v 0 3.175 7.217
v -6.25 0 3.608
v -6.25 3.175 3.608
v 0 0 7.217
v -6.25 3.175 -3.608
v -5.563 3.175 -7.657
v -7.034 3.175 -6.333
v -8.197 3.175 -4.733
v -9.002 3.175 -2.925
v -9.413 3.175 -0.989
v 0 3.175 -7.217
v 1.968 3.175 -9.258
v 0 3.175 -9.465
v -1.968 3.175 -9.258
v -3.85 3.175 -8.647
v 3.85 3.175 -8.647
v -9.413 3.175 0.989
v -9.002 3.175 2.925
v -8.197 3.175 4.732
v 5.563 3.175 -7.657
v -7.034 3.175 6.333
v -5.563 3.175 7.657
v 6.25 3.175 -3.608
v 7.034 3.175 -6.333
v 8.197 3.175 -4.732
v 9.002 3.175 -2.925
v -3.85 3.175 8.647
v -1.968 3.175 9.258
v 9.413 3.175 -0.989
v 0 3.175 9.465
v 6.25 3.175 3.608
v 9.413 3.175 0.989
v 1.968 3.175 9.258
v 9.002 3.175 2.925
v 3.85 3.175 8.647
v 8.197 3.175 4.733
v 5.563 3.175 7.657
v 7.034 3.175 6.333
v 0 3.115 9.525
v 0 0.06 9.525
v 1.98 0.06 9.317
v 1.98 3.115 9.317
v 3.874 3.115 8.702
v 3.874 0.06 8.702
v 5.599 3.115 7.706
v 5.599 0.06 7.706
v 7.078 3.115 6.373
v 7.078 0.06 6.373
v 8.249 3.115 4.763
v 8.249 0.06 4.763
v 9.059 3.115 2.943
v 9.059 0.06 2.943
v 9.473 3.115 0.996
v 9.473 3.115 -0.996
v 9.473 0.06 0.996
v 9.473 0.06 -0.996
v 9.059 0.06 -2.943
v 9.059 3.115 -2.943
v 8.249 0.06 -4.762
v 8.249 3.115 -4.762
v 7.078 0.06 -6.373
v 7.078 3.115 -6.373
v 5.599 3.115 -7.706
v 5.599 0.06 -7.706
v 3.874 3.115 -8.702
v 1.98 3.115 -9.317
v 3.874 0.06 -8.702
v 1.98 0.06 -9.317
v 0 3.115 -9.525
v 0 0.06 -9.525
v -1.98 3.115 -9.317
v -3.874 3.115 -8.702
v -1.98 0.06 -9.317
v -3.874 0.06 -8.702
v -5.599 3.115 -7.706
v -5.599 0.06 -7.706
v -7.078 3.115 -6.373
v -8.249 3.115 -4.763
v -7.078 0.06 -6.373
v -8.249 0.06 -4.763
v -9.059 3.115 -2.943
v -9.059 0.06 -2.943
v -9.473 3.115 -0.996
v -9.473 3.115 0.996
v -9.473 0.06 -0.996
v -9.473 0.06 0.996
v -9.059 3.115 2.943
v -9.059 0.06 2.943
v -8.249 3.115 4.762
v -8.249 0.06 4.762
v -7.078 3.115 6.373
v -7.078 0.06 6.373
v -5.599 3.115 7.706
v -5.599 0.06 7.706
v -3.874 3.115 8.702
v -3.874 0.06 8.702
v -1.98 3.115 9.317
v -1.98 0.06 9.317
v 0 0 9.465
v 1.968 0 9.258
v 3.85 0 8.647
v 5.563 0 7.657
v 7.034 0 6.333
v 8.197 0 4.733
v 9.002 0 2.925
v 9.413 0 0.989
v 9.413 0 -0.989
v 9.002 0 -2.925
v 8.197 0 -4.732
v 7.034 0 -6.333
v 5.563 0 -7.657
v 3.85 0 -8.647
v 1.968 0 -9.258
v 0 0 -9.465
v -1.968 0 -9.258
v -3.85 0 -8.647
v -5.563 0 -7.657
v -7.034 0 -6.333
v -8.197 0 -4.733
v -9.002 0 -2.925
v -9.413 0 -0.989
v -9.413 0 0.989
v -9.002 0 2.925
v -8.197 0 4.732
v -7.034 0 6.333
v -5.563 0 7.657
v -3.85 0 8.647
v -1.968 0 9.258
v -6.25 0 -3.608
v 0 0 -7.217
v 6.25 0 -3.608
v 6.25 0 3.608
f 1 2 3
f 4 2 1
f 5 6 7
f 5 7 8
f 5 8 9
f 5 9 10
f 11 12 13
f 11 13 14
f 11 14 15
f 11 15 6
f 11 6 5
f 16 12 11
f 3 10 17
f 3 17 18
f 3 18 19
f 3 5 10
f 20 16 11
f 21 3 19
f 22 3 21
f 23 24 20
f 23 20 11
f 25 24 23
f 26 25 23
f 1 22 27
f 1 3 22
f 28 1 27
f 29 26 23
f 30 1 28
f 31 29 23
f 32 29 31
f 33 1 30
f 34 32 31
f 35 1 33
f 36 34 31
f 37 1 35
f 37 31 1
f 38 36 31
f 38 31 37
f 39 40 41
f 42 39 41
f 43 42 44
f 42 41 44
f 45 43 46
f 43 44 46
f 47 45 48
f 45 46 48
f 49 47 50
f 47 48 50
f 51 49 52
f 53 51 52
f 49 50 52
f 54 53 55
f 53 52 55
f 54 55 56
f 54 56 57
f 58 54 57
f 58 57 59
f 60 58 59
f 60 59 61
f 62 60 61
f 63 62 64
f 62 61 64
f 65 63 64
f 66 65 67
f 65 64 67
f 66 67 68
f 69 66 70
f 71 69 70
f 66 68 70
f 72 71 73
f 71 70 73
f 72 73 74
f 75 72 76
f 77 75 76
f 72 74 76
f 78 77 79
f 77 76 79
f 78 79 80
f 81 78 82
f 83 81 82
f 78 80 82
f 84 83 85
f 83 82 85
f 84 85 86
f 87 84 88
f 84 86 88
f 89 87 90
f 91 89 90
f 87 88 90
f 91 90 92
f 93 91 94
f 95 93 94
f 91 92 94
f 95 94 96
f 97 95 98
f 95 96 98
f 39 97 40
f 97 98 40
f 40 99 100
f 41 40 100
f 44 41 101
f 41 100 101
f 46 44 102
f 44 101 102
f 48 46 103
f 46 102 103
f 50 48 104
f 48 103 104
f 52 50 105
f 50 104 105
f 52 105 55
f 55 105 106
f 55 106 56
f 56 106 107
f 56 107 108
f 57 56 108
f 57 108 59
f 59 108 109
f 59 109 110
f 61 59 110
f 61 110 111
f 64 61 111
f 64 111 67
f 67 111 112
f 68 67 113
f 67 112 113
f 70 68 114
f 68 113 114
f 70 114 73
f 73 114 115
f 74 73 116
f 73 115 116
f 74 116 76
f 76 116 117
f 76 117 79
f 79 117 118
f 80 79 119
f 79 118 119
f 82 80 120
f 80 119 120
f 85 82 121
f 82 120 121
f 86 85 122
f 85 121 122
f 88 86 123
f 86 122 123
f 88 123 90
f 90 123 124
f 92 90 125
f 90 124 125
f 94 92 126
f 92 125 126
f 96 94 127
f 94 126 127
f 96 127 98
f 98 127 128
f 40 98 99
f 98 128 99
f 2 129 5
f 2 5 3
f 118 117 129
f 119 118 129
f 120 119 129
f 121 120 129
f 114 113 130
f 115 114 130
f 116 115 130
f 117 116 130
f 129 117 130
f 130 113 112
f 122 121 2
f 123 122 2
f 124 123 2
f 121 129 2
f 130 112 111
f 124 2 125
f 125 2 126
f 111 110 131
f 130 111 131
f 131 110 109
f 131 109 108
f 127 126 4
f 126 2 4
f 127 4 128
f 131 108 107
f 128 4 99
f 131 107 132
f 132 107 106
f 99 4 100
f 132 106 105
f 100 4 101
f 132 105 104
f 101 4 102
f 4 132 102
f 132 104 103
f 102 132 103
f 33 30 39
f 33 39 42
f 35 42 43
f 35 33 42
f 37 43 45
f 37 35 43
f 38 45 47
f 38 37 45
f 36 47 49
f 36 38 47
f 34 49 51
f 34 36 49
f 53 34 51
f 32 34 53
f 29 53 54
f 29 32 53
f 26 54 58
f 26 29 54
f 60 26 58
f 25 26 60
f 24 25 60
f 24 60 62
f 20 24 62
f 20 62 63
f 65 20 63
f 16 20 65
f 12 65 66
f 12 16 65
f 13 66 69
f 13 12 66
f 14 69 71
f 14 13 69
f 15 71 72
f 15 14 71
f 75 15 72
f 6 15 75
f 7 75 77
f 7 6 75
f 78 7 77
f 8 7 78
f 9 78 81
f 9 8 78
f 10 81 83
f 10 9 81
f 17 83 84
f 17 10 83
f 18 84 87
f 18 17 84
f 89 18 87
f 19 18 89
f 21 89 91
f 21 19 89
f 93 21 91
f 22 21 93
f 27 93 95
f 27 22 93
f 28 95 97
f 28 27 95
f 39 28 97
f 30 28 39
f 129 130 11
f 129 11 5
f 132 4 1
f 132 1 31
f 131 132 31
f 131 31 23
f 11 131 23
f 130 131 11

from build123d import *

# Parameters (mm, degrees)
SKETCH1_R           = 9.525
BOSS_EXTRUDE1_DEPTH = 3.175
CHAMFER1_SIZE       = 0.06
CHAMFER2_SIZE       = 0.06


with BuildPart() as part:
    # Sketch1 → Boss-Extrude1 (new body)
    with BuildSketch(Plane(origin=(0, 0, 0), x_dir=(1, 0, 0), z_dir=(0, 1, 0))):
        with Locations(Location((0, 0, 0), (0, 0, 270))):
            Circle(SKETCH1_R)
        Polygon((0, 7.216878365), (-6.25, 3.608439182), (-6.25, -3.608439182), (0, -7.216878365), (6.25, -3.608439182), (6.25, 3.608439182), align=None, mode=Mode.SUBTRACT)
    extrude(amount=BOSS_EXTRUDE1_DEPTH)

    # Chamfer1
    chamfer1_edges = [part.edges().sort_by_distance(p)[0] for p in [
        (0, 0, -9.525),
    ]]
    chamfer(chamfer1_edges, length=CHAMFER1_SIZE)

    # Chamfer2
    chamfer2_edges = [part.edges().sort_by_distance(p)[0] for p in [
        (0, 3.175, -9.525),
    ]]
    chamfer(chamfer2_edges, length=CHAMFER2_SIZE)


solid = part.part
